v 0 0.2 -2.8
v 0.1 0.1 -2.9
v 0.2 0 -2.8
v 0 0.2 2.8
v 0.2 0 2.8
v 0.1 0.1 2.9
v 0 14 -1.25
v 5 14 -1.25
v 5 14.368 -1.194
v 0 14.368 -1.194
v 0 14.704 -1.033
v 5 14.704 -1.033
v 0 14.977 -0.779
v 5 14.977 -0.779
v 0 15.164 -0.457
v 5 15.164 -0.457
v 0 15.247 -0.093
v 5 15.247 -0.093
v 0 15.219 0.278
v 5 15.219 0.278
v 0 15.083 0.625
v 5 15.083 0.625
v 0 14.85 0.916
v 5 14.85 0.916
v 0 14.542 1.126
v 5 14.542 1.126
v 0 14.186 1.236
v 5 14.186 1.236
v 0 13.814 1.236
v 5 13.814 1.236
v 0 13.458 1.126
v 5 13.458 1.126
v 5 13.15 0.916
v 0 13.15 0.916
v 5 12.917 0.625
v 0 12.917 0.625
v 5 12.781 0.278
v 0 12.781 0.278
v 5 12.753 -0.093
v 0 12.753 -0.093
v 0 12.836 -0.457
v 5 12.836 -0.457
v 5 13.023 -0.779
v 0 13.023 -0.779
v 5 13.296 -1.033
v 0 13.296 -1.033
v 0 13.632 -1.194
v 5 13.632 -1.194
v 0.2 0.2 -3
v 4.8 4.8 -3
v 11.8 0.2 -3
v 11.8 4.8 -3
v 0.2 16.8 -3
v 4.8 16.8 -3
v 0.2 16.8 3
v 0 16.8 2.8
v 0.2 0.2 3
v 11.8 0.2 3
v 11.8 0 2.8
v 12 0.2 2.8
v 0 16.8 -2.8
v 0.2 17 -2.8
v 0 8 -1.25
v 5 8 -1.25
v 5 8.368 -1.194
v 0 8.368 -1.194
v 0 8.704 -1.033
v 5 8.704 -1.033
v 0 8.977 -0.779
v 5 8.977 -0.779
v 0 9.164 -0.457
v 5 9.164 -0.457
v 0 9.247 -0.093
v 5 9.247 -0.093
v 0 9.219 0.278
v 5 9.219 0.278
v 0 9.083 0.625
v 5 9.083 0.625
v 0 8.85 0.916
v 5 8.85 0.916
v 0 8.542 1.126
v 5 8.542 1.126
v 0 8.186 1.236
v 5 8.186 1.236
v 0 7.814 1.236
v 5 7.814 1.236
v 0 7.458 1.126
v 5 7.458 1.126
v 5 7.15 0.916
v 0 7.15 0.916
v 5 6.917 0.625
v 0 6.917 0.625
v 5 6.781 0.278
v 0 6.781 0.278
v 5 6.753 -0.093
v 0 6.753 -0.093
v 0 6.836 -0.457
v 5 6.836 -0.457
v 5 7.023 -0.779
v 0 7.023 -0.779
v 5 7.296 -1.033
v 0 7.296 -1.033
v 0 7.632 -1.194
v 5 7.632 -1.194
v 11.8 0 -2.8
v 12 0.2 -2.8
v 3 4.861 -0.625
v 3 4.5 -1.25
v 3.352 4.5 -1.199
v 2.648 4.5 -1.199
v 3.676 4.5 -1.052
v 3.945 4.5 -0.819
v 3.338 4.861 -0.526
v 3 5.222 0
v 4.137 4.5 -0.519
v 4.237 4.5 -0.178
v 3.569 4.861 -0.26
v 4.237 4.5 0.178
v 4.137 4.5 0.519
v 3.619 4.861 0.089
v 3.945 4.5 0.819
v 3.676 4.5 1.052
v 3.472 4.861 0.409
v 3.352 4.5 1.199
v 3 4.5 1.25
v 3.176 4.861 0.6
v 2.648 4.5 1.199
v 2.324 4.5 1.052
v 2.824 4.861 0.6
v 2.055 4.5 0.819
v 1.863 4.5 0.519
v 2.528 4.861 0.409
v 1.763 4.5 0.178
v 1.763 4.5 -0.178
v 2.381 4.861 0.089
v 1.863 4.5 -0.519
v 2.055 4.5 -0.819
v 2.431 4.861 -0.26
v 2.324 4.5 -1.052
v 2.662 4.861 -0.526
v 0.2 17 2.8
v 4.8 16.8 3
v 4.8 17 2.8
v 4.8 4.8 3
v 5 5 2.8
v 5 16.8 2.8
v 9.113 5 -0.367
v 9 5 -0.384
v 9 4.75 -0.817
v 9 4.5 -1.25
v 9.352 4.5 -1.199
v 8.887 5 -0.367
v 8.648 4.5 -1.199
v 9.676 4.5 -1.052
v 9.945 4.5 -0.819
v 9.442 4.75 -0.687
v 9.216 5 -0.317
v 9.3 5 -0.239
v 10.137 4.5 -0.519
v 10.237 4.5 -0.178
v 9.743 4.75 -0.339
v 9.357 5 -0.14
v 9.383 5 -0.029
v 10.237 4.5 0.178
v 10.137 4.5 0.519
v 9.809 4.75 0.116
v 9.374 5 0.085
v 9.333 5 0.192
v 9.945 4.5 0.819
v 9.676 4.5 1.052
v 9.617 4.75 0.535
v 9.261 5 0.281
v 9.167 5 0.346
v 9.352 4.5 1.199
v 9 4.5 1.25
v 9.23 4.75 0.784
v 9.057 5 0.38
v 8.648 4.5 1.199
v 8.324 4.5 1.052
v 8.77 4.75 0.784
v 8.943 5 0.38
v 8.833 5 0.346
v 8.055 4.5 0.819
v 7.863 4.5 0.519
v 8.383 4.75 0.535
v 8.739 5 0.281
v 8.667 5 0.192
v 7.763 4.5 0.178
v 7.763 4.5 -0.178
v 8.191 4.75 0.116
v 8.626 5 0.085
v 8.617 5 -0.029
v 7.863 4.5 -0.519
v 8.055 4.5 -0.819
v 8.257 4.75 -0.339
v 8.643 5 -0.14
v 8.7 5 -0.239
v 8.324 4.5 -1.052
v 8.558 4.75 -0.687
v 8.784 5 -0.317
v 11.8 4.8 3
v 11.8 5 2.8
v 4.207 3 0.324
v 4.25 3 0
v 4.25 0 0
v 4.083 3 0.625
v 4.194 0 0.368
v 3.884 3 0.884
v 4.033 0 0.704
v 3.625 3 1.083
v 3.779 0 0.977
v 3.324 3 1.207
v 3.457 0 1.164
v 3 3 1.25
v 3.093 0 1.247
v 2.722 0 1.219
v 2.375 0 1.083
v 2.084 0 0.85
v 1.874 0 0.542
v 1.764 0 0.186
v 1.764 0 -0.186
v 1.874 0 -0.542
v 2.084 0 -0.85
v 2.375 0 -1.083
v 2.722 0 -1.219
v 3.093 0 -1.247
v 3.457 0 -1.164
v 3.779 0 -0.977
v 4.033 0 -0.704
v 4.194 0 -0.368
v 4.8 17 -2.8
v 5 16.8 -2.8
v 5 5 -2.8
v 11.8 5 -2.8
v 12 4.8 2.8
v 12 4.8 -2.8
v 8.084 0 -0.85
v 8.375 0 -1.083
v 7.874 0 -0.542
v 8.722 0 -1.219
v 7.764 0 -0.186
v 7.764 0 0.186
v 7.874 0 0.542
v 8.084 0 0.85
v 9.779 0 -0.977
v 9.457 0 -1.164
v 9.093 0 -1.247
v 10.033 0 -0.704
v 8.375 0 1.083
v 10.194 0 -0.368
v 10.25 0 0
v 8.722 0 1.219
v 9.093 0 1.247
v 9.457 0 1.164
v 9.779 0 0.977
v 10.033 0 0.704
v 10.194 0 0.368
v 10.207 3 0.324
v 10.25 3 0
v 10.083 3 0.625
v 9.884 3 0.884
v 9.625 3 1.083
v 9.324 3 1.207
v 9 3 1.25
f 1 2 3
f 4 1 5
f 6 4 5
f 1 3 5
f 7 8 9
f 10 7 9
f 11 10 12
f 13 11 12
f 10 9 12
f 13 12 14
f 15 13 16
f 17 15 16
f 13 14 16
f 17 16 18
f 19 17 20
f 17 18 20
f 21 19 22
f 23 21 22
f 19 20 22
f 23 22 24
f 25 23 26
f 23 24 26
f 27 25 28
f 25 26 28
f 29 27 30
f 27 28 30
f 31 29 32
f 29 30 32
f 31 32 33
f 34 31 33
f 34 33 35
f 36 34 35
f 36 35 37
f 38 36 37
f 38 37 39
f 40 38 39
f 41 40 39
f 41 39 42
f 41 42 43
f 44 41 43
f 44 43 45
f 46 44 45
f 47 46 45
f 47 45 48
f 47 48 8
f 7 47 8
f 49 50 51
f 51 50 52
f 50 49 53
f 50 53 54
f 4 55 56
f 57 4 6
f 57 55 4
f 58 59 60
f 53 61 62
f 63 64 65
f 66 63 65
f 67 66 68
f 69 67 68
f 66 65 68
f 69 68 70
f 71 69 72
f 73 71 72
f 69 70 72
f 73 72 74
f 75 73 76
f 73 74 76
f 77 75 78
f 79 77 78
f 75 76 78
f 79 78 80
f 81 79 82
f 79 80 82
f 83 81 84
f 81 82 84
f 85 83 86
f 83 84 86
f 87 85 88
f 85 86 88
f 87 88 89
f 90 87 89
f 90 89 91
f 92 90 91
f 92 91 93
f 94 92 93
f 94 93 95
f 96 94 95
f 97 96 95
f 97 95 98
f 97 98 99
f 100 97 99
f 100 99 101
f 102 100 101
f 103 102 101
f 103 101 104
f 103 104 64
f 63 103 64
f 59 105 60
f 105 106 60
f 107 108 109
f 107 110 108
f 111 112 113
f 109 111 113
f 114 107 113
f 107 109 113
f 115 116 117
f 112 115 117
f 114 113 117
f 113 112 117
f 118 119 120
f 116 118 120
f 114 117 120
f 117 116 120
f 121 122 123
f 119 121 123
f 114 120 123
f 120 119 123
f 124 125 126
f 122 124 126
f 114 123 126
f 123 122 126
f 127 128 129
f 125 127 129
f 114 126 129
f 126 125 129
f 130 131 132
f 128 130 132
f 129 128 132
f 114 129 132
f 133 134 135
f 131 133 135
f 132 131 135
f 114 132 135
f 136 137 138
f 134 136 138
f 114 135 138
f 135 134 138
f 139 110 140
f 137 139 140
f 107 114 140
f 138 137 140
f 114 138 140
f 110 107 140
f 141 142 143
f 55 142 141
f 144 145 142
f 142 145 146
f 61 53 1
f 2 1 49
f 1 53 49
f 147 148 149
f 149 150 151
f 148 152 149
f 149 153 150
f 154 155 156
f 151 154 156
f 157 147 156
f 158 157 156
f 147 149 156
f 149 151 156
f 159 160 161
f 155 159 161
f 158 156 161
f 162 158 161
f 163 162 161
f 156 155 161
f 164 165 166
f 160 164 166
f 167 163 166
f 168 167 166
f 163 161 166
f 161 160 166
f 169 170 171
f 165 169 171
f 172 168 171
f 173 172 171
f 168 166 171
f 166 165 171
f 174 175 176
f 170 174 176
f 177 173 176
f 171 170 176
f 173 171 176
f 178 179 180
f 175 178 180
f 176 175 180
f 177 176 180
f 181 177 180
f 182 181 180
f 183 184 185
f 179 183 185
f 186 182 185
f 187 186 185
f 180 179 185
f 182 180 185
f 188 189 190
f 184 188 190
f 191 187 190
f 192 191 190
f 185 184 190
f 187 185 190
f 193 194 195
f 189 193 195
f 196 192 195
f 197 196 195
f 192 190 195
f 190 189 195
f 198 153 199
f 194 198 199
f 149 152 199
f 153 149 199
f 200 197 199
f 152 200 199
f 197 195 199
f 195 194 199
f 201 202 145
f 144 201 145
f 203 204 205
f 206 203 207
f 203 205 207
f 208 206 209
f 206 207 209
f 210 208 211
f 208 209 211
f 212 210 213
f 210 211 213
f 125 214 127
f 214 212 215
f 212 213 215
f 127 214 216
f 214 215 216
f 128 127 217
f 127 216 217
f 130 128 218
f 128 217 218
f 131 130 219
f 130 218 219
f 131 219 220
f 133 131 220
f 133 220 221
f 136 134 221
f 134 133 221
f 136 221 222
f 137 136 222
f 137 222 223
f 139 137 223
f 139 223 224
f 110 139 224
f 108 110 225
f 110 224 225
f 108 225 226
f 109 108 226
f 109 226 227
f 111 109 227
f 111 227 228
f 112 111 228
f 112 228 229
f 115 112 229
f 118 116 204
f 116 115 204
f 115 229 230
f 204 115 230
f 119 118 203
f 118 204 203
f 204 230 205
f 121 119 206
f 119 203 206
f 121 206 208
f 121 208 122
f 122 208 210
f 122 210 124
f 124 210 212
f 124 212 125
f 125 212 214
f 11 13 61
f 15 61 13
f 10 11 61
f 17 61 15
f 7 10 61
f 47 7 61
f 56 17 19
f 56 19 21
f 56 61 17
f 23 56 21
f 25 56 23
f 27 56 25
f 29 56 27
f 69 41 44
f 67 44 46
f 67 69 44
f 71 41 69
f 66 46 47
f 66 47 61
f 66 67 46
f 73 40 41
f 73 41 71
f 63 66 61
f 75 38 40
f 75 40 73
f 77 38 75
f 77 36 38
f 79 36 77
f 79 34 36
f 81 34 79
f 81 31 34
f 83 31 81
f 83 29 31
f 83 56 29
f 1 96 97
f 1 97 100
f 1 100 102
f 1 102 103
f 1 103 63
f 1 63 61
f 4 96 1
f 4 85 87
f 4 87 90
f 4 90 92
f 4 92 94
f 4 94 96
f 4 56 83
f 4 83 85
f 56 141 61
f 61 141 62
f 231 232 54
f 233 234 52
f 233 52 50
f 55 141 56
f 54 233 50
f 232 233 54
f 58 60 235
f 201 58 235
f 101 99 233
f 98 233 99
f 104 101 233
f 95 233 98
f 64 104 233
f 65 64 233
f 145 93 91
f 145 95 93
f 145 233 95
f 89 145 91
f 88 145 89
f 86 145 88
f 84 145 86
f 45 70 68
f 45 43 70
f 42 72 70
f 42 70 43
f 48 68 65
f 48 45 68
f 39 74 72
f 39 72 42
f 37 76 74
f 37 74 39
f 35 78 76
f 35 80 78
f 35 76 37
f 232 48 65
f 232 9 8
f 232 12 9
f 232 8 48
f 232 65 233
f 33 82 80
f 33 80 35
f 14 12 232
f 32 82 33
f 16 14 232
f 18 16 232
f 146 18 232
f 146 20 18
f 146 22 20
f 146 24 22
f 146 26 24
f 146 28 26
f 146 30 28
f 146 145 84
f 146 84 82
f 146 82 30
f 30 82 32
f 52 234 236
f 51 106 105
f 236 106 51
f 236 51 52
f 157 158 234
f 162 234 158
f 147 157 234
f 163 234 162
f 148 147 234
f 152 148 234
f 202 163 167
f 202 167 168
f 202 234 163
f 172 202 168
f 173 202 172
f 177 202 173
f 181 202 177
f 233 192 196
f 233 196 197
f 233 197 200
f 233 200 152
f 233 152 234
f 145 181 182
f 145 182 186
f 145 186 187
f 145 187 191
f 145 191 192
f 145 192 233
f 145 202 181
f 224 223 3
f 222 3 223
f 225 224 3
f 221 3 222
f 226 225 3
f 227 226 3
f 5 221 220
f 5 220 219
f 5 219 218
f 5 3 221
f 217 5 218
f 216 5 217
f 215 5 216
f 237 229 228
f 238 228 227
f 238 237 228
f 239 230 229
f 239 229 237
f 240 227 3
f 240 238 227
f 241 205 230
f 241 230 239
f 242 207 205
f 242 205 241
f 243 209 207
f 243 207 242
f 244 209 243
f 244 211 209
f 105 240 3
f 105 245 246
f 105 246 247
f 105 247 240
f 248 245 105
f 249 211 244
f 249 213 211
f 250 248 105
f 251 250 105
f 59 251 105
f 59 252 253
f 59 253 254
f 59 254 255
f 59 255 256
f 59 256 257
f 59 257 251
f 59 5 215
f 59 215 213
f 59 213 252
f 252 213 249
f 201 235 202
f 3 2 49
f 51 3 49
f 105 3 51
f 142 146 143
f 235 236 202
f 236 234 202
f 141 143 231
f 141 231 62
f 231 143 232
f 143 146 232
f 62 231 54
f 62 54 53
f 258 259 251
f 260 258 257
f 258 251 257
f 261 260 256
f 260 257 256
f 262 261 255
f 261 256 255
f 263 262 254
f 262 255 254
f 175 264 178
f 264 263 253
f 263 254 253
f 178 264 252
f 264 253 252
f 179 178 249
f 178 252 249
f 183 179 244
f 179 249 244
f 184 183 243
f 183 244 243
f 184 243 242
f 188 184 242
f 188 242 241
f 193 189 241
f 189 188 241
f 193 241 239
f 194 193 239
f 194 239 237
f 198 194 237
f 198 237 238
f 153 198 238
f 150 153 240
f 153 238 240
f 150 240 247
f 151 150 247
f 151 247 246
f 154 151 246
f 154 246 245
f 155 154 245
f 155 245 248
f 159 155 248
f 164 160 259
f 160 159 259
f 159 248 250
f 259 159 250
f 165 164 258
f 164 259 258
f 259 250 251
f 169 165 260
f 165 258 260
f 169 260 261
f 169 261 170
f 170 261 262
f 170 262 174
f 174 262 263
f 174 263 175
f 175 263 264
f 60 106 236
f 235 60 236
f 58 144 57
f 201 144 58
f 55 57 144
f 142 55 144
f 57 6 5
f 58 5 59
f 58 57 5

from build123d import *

# Parameters (mm, degrees)
EXTRUDE_1_DEPTH        = 3
SKETCH_2_R             = 1.25
CUT_EXTRUDE_1_DEPTH    = 6
SKETCH_3_R             = 1.25
CUT_EXTRUDE_2_DEPTH    = 3
HOLE_WIZARD_M3_1_D     = 2.5
HOLE_WIZARD_M3_1_DEPTH = 4.5
HOLE_WIZARD_M3_1_TIP   = 0.721687836
CHAMFER_1_SIZE         = 0.2
CHAMFER_2_SIZE         = 0.2


with BuildPart() as part:
    # 草图1 → 凸台-拉伸1 (new body, symmetric)
    with BuildSketch(Plane.XY):
        Polygon((0, 17), (0, 0), (12, 0), (12, 5), (5, 5), (5, 17), align=None)
    extrude(amount=EXTRUDE_1_DEPTH, both=True)

    # 草图2 → 切除-拉伸1 (cut)
    with BuildSketch(Plane(origin=(5, 0, 0), x_dir=(0, 0, -1), z_dir=(1, 0, 0))):
        with Locations((0, 14)):
            Circle(SKETCH_2_R)
        with Locations((0, 8)):
            Circle(SKETCH_2_R)
    extrude(amount=-CUT_EXTRUDE_1_DEPTH, mode=Mode.SUBTRACT)

    # 草图3 → 切除-拉伸2 (cut)
    with BuildSketch(Plane.XZ):
        with Locations((9, 0)):
            Circle(SKETCH_3_R)
        with Locations((3, 0)):
            Circle(SKETCH_3_R)
    extrude(amount=-CUT_EXTRUDE_2_DEPTH, mode=Mode.SUBTRACT)

    # M3 螺纹孔1
    with Locations(Plane(origin=(3, 0, 0), x_dir=(0, 0, -1), z_dir=(0, -1, 0))):
        with Locations((0, 0), (0, 6)):
            Hole(HOLE_WIZARD_M3_1_D / 2, depth=HOLE_WIZARD_M3_1_DEPTH)
            with Locations((0, 0, -(HOLE_WIZARD_M3_1_DEPTH + HOLE_WIZARD_M3_1_TIP / 2))):  # 120° drill point
                Cone(0, HOLE_WIZARD_M3_1_D / 2, HOLE_WIZARD_M3_1_TIP, mode=Mode.SUBTRACT)

    # 倒角1
    chamfer_1_edges = [part.edges().sort_by_distance(p)[0] for p in [
        (6, 0, 3),
        (5, 17, 0),
        (12, 5, 0),
        (12, 0, 0),
        (0, 17, 0),
        (12, 2.5, 3),
        (8.5, 5, 3),
        (5, 11, 3),
        (2.5, 17, 3),
        (5, 11, -3),
        (8.5, 5, -3),
        (12, 2.5, -3),
        (0, 8.5, 3),
        (6, 0, -3),
        (0, 8.5, -3),
        (2.5, 17, -3),
    ]]
    chamfer(chamfer_1_edges, length=CHAMFER_1_SIZE)

    # 倒角2
    chamfer_2_edges = [part.edges().sort_by_distance(p)[0] for p in [
        (0, 0, 0),
    ]]
    chamfer(chamfer_2_edges, length=CHAMFER_2_SIZE)


solid = part.part
